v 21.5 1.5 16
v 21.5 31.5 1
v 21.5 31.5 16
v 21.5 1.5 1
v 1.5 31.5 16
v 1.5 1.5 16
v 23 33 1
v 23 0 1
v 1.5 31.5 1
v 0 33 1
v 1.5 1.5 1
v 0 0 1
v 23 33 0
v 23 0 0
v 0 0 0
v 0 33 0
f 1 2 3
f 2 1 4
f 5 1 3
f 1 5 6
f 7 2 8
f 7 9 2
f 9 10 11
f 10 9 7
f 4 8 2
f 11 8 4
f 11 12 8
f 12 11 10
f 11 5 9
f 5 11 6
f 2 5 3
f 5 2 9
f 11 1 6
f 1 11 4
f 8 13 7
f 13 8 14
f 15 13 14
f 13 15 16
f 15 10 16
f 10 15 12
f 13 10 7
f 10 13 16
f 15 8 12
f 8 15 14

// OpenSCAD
translate([1.5,1.5,1]){
    cube([20,30,15]);
}
cube([23,33,1]);
